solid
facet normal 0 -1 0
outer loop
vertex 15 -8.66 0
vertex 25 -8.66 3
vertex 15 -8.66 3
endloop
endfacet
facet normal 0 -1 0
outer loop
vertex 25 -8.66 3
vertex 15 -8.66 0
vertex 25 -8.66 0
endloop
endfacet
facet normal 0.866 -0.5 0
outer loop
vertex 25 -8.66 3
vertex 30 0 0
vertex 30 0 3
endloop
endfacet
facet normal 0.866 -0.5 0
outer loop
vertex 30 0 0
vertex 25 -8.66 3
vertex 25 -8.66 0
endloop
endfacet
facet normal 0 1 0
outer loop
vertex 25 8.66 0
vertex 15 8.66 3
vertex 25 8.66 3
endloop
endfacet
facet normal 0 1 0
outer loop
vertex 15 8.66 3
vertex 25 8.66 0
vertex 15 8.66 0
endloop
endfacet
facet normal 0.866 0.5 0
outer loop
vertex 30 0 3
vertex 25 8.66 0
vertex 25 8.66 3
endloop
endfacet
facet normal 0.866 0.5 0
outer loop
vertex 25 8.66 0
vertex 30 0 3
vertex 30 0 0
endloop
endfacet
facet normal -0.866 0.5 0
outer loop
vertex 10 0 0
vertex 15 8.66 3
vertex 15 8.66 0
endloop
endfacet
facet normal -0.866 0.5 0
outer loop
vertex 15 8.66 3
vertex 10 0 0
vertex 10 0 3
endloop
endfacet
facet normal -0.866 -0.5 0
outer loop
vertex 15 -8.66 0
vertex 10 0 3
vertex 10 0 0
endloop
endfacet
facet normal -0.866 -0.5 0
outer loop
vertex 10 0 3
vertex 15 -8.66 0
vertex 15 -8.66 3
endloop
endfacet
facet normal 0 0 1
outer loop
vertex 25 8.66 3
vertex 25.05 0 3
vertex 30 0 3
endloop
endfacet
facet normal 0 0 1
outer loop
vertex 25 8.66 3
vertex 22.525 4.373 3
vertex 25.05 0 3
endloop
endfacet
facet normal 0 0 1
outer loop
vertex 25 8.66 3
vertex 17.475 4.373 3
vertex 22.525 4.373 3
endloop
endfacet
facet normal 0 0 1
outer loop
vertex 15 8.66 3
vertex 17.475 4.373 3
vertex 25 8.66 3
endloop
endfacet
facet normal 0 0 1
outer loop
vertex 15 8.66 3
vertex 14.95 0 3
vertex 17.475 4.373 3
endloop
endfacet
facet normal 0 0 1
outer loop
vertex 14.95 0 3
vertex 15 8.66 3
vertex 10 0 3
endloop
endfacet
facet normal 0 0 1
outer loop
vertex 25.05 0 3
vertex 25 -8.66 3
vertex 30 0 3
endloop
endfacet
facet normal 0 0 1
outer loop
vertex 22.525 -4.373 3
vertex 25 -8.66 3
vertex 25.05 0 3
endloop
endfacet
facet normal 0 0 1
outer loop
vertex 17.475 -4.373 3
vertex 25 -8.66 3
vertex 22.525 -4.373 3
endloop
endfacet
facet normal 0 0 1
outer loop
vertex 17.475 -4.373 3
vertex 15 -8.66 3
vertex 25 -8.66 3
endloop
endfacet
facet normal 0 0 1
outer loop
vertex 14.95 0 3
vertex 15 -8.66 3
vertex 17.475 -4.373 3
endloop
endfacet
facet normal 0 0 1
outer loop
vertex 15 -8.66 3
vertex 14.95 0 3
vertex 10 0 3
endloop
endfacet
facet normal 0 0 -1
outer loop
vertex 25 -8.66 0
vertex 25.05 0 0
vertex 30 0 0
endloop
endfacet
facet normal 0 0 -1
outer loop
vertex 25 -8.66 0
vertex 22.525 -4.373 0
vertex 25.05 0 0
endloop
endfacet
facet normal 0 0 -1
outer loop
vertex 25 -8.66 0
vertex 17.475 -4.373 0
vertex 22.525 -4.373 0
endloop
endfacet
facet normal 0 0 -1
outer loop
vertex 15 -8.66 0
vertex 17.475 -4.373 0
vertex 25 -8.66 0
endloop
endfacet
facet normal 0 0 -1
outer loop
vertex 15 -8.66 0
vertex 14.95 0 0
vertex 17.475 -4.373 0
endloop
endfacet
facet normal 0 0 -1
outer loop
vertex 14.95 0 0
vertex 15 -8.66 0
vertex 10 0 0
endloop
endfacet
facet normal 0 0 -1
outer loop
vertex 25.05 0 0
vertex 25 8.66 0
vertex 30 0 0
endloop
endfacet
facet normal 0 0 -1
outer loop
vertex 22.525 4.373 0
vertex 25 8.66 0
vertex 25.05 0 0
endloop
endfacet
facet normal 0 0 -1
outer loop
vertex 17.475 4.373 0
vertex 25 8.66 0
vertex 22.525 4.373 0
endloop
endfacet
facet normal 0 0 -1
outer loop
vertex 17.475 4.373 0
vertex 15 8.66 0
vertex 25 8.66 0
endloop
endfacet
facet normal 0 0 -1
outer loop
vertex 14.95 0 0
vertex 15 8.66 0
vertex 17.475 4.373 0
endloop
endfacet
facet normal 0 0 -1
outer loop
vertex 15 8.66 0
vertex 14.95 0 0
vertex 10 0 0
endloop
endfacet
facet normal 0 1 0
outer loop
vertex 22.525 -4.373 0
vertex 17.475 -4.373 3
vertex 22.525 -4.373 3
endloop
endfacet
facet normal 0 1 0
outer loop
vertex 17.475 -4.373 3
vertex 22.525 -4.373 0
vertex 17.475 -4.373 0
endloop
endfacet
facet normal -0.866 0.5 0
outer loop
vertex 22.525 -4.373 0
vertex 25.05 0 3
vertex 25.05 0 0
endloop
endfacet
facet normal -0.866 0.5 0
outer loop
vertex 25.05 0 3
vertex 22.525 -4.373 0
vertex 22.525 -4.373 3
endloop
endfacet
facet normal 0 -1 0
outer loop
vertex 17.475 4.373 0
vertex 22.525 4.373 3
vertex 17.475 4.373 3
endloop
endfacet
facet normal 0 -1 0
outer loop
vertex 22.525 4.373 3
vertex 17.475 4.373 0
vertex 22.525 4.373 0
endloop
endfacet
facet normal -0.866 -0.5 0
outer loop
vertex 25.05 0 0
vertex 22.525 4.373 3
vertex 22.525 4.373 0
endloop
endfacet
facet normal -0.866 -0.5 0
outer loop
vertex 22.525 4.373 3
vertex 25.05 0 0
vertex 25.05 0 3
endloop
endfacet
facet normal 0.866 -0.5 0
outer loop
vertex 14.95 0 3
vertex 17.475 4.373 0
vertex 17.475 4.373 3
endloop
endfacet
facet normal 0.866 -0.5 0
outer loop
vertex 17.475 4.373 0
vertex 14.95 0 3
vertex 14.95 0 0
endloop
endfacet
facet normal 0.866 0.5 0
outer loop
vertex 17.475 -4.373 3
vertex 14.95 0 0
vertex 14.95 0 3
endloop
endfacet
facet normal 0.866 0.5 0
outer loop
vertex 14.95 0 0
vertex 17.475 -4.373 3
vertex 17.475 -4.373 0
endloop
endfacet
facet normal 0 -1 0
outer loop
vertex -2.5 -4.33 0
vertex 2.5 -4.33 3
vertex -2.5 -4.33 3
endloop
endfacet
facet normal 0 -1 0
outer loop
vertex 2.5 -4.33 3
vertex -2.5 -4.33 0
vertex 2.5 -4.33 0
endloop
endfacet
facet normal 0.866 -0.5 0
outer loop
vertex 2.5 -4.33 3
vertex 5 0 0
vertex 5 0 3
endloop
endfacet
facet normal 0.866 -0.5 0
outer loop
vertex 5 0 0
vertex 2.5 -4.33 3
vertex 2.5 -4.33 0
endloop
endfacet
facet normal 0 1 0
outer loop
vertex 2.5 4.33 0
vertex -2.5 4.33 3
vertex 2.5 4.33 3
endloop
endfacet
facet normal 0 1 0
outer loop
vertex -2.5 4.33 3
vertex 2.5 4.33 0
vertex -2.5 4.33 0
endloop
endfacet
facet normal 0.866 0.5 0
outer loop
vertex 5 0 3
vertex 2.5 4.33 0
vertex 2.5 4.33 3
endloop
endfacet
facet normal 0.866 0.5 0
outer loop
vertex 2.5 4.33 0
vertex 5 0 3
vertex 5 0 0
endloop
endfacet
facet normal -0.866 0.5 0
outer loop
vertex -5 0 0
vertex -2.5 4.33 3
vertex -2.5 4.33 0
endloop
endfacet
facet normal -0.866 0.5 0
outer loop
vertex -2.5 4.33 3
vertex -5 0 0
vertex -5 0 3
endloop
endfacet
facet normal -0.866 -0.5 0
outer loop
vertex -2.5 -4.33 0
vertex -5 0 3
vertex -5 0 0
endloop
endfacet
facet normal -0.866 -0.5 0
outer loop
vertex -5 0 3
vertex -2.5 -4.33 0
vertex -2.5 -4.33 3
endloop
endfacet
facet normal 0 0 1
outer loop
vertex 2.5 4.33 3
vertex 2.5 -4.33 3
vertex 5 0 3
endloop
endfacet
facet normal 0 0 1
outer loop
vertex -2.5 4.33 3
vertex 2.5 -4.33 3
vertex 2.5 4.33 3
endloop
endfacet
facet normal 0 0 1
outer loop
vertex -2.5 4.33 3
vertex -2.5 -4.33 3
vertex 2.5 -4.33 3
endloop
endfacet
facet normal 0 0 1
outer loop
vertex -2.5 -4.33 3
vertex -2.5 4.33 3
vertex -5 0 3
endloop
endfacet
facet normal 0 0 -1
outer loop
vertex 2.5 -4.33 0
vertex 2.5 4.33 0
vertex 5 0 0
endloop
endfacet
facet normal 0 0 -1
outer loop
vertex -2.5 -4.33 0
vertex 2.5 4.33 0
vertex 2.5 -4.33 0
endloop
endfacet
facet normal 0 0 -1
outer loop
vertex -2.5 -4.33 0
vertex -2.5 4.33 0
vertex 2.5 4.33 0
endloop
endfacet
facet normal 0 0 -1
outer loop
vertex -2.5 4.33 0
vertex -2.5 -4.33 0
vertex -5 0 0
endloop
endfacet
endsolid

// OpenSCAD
$fn=6;
tolerance=0.1;
cylinder(d=10,h=3);
//translate([0,0,-3])cylinder(d=10,h=3,$fn=90);
translate([20,0,0])difference(){
    union(){
        cylinder(d=20,h=3);
        //translate([0,0,-3])cylinder(d=20,h=3,$fn=90);
    }
    translate([0,0,-0.5])cylinder(d=10+tolerance,h=4);
}
